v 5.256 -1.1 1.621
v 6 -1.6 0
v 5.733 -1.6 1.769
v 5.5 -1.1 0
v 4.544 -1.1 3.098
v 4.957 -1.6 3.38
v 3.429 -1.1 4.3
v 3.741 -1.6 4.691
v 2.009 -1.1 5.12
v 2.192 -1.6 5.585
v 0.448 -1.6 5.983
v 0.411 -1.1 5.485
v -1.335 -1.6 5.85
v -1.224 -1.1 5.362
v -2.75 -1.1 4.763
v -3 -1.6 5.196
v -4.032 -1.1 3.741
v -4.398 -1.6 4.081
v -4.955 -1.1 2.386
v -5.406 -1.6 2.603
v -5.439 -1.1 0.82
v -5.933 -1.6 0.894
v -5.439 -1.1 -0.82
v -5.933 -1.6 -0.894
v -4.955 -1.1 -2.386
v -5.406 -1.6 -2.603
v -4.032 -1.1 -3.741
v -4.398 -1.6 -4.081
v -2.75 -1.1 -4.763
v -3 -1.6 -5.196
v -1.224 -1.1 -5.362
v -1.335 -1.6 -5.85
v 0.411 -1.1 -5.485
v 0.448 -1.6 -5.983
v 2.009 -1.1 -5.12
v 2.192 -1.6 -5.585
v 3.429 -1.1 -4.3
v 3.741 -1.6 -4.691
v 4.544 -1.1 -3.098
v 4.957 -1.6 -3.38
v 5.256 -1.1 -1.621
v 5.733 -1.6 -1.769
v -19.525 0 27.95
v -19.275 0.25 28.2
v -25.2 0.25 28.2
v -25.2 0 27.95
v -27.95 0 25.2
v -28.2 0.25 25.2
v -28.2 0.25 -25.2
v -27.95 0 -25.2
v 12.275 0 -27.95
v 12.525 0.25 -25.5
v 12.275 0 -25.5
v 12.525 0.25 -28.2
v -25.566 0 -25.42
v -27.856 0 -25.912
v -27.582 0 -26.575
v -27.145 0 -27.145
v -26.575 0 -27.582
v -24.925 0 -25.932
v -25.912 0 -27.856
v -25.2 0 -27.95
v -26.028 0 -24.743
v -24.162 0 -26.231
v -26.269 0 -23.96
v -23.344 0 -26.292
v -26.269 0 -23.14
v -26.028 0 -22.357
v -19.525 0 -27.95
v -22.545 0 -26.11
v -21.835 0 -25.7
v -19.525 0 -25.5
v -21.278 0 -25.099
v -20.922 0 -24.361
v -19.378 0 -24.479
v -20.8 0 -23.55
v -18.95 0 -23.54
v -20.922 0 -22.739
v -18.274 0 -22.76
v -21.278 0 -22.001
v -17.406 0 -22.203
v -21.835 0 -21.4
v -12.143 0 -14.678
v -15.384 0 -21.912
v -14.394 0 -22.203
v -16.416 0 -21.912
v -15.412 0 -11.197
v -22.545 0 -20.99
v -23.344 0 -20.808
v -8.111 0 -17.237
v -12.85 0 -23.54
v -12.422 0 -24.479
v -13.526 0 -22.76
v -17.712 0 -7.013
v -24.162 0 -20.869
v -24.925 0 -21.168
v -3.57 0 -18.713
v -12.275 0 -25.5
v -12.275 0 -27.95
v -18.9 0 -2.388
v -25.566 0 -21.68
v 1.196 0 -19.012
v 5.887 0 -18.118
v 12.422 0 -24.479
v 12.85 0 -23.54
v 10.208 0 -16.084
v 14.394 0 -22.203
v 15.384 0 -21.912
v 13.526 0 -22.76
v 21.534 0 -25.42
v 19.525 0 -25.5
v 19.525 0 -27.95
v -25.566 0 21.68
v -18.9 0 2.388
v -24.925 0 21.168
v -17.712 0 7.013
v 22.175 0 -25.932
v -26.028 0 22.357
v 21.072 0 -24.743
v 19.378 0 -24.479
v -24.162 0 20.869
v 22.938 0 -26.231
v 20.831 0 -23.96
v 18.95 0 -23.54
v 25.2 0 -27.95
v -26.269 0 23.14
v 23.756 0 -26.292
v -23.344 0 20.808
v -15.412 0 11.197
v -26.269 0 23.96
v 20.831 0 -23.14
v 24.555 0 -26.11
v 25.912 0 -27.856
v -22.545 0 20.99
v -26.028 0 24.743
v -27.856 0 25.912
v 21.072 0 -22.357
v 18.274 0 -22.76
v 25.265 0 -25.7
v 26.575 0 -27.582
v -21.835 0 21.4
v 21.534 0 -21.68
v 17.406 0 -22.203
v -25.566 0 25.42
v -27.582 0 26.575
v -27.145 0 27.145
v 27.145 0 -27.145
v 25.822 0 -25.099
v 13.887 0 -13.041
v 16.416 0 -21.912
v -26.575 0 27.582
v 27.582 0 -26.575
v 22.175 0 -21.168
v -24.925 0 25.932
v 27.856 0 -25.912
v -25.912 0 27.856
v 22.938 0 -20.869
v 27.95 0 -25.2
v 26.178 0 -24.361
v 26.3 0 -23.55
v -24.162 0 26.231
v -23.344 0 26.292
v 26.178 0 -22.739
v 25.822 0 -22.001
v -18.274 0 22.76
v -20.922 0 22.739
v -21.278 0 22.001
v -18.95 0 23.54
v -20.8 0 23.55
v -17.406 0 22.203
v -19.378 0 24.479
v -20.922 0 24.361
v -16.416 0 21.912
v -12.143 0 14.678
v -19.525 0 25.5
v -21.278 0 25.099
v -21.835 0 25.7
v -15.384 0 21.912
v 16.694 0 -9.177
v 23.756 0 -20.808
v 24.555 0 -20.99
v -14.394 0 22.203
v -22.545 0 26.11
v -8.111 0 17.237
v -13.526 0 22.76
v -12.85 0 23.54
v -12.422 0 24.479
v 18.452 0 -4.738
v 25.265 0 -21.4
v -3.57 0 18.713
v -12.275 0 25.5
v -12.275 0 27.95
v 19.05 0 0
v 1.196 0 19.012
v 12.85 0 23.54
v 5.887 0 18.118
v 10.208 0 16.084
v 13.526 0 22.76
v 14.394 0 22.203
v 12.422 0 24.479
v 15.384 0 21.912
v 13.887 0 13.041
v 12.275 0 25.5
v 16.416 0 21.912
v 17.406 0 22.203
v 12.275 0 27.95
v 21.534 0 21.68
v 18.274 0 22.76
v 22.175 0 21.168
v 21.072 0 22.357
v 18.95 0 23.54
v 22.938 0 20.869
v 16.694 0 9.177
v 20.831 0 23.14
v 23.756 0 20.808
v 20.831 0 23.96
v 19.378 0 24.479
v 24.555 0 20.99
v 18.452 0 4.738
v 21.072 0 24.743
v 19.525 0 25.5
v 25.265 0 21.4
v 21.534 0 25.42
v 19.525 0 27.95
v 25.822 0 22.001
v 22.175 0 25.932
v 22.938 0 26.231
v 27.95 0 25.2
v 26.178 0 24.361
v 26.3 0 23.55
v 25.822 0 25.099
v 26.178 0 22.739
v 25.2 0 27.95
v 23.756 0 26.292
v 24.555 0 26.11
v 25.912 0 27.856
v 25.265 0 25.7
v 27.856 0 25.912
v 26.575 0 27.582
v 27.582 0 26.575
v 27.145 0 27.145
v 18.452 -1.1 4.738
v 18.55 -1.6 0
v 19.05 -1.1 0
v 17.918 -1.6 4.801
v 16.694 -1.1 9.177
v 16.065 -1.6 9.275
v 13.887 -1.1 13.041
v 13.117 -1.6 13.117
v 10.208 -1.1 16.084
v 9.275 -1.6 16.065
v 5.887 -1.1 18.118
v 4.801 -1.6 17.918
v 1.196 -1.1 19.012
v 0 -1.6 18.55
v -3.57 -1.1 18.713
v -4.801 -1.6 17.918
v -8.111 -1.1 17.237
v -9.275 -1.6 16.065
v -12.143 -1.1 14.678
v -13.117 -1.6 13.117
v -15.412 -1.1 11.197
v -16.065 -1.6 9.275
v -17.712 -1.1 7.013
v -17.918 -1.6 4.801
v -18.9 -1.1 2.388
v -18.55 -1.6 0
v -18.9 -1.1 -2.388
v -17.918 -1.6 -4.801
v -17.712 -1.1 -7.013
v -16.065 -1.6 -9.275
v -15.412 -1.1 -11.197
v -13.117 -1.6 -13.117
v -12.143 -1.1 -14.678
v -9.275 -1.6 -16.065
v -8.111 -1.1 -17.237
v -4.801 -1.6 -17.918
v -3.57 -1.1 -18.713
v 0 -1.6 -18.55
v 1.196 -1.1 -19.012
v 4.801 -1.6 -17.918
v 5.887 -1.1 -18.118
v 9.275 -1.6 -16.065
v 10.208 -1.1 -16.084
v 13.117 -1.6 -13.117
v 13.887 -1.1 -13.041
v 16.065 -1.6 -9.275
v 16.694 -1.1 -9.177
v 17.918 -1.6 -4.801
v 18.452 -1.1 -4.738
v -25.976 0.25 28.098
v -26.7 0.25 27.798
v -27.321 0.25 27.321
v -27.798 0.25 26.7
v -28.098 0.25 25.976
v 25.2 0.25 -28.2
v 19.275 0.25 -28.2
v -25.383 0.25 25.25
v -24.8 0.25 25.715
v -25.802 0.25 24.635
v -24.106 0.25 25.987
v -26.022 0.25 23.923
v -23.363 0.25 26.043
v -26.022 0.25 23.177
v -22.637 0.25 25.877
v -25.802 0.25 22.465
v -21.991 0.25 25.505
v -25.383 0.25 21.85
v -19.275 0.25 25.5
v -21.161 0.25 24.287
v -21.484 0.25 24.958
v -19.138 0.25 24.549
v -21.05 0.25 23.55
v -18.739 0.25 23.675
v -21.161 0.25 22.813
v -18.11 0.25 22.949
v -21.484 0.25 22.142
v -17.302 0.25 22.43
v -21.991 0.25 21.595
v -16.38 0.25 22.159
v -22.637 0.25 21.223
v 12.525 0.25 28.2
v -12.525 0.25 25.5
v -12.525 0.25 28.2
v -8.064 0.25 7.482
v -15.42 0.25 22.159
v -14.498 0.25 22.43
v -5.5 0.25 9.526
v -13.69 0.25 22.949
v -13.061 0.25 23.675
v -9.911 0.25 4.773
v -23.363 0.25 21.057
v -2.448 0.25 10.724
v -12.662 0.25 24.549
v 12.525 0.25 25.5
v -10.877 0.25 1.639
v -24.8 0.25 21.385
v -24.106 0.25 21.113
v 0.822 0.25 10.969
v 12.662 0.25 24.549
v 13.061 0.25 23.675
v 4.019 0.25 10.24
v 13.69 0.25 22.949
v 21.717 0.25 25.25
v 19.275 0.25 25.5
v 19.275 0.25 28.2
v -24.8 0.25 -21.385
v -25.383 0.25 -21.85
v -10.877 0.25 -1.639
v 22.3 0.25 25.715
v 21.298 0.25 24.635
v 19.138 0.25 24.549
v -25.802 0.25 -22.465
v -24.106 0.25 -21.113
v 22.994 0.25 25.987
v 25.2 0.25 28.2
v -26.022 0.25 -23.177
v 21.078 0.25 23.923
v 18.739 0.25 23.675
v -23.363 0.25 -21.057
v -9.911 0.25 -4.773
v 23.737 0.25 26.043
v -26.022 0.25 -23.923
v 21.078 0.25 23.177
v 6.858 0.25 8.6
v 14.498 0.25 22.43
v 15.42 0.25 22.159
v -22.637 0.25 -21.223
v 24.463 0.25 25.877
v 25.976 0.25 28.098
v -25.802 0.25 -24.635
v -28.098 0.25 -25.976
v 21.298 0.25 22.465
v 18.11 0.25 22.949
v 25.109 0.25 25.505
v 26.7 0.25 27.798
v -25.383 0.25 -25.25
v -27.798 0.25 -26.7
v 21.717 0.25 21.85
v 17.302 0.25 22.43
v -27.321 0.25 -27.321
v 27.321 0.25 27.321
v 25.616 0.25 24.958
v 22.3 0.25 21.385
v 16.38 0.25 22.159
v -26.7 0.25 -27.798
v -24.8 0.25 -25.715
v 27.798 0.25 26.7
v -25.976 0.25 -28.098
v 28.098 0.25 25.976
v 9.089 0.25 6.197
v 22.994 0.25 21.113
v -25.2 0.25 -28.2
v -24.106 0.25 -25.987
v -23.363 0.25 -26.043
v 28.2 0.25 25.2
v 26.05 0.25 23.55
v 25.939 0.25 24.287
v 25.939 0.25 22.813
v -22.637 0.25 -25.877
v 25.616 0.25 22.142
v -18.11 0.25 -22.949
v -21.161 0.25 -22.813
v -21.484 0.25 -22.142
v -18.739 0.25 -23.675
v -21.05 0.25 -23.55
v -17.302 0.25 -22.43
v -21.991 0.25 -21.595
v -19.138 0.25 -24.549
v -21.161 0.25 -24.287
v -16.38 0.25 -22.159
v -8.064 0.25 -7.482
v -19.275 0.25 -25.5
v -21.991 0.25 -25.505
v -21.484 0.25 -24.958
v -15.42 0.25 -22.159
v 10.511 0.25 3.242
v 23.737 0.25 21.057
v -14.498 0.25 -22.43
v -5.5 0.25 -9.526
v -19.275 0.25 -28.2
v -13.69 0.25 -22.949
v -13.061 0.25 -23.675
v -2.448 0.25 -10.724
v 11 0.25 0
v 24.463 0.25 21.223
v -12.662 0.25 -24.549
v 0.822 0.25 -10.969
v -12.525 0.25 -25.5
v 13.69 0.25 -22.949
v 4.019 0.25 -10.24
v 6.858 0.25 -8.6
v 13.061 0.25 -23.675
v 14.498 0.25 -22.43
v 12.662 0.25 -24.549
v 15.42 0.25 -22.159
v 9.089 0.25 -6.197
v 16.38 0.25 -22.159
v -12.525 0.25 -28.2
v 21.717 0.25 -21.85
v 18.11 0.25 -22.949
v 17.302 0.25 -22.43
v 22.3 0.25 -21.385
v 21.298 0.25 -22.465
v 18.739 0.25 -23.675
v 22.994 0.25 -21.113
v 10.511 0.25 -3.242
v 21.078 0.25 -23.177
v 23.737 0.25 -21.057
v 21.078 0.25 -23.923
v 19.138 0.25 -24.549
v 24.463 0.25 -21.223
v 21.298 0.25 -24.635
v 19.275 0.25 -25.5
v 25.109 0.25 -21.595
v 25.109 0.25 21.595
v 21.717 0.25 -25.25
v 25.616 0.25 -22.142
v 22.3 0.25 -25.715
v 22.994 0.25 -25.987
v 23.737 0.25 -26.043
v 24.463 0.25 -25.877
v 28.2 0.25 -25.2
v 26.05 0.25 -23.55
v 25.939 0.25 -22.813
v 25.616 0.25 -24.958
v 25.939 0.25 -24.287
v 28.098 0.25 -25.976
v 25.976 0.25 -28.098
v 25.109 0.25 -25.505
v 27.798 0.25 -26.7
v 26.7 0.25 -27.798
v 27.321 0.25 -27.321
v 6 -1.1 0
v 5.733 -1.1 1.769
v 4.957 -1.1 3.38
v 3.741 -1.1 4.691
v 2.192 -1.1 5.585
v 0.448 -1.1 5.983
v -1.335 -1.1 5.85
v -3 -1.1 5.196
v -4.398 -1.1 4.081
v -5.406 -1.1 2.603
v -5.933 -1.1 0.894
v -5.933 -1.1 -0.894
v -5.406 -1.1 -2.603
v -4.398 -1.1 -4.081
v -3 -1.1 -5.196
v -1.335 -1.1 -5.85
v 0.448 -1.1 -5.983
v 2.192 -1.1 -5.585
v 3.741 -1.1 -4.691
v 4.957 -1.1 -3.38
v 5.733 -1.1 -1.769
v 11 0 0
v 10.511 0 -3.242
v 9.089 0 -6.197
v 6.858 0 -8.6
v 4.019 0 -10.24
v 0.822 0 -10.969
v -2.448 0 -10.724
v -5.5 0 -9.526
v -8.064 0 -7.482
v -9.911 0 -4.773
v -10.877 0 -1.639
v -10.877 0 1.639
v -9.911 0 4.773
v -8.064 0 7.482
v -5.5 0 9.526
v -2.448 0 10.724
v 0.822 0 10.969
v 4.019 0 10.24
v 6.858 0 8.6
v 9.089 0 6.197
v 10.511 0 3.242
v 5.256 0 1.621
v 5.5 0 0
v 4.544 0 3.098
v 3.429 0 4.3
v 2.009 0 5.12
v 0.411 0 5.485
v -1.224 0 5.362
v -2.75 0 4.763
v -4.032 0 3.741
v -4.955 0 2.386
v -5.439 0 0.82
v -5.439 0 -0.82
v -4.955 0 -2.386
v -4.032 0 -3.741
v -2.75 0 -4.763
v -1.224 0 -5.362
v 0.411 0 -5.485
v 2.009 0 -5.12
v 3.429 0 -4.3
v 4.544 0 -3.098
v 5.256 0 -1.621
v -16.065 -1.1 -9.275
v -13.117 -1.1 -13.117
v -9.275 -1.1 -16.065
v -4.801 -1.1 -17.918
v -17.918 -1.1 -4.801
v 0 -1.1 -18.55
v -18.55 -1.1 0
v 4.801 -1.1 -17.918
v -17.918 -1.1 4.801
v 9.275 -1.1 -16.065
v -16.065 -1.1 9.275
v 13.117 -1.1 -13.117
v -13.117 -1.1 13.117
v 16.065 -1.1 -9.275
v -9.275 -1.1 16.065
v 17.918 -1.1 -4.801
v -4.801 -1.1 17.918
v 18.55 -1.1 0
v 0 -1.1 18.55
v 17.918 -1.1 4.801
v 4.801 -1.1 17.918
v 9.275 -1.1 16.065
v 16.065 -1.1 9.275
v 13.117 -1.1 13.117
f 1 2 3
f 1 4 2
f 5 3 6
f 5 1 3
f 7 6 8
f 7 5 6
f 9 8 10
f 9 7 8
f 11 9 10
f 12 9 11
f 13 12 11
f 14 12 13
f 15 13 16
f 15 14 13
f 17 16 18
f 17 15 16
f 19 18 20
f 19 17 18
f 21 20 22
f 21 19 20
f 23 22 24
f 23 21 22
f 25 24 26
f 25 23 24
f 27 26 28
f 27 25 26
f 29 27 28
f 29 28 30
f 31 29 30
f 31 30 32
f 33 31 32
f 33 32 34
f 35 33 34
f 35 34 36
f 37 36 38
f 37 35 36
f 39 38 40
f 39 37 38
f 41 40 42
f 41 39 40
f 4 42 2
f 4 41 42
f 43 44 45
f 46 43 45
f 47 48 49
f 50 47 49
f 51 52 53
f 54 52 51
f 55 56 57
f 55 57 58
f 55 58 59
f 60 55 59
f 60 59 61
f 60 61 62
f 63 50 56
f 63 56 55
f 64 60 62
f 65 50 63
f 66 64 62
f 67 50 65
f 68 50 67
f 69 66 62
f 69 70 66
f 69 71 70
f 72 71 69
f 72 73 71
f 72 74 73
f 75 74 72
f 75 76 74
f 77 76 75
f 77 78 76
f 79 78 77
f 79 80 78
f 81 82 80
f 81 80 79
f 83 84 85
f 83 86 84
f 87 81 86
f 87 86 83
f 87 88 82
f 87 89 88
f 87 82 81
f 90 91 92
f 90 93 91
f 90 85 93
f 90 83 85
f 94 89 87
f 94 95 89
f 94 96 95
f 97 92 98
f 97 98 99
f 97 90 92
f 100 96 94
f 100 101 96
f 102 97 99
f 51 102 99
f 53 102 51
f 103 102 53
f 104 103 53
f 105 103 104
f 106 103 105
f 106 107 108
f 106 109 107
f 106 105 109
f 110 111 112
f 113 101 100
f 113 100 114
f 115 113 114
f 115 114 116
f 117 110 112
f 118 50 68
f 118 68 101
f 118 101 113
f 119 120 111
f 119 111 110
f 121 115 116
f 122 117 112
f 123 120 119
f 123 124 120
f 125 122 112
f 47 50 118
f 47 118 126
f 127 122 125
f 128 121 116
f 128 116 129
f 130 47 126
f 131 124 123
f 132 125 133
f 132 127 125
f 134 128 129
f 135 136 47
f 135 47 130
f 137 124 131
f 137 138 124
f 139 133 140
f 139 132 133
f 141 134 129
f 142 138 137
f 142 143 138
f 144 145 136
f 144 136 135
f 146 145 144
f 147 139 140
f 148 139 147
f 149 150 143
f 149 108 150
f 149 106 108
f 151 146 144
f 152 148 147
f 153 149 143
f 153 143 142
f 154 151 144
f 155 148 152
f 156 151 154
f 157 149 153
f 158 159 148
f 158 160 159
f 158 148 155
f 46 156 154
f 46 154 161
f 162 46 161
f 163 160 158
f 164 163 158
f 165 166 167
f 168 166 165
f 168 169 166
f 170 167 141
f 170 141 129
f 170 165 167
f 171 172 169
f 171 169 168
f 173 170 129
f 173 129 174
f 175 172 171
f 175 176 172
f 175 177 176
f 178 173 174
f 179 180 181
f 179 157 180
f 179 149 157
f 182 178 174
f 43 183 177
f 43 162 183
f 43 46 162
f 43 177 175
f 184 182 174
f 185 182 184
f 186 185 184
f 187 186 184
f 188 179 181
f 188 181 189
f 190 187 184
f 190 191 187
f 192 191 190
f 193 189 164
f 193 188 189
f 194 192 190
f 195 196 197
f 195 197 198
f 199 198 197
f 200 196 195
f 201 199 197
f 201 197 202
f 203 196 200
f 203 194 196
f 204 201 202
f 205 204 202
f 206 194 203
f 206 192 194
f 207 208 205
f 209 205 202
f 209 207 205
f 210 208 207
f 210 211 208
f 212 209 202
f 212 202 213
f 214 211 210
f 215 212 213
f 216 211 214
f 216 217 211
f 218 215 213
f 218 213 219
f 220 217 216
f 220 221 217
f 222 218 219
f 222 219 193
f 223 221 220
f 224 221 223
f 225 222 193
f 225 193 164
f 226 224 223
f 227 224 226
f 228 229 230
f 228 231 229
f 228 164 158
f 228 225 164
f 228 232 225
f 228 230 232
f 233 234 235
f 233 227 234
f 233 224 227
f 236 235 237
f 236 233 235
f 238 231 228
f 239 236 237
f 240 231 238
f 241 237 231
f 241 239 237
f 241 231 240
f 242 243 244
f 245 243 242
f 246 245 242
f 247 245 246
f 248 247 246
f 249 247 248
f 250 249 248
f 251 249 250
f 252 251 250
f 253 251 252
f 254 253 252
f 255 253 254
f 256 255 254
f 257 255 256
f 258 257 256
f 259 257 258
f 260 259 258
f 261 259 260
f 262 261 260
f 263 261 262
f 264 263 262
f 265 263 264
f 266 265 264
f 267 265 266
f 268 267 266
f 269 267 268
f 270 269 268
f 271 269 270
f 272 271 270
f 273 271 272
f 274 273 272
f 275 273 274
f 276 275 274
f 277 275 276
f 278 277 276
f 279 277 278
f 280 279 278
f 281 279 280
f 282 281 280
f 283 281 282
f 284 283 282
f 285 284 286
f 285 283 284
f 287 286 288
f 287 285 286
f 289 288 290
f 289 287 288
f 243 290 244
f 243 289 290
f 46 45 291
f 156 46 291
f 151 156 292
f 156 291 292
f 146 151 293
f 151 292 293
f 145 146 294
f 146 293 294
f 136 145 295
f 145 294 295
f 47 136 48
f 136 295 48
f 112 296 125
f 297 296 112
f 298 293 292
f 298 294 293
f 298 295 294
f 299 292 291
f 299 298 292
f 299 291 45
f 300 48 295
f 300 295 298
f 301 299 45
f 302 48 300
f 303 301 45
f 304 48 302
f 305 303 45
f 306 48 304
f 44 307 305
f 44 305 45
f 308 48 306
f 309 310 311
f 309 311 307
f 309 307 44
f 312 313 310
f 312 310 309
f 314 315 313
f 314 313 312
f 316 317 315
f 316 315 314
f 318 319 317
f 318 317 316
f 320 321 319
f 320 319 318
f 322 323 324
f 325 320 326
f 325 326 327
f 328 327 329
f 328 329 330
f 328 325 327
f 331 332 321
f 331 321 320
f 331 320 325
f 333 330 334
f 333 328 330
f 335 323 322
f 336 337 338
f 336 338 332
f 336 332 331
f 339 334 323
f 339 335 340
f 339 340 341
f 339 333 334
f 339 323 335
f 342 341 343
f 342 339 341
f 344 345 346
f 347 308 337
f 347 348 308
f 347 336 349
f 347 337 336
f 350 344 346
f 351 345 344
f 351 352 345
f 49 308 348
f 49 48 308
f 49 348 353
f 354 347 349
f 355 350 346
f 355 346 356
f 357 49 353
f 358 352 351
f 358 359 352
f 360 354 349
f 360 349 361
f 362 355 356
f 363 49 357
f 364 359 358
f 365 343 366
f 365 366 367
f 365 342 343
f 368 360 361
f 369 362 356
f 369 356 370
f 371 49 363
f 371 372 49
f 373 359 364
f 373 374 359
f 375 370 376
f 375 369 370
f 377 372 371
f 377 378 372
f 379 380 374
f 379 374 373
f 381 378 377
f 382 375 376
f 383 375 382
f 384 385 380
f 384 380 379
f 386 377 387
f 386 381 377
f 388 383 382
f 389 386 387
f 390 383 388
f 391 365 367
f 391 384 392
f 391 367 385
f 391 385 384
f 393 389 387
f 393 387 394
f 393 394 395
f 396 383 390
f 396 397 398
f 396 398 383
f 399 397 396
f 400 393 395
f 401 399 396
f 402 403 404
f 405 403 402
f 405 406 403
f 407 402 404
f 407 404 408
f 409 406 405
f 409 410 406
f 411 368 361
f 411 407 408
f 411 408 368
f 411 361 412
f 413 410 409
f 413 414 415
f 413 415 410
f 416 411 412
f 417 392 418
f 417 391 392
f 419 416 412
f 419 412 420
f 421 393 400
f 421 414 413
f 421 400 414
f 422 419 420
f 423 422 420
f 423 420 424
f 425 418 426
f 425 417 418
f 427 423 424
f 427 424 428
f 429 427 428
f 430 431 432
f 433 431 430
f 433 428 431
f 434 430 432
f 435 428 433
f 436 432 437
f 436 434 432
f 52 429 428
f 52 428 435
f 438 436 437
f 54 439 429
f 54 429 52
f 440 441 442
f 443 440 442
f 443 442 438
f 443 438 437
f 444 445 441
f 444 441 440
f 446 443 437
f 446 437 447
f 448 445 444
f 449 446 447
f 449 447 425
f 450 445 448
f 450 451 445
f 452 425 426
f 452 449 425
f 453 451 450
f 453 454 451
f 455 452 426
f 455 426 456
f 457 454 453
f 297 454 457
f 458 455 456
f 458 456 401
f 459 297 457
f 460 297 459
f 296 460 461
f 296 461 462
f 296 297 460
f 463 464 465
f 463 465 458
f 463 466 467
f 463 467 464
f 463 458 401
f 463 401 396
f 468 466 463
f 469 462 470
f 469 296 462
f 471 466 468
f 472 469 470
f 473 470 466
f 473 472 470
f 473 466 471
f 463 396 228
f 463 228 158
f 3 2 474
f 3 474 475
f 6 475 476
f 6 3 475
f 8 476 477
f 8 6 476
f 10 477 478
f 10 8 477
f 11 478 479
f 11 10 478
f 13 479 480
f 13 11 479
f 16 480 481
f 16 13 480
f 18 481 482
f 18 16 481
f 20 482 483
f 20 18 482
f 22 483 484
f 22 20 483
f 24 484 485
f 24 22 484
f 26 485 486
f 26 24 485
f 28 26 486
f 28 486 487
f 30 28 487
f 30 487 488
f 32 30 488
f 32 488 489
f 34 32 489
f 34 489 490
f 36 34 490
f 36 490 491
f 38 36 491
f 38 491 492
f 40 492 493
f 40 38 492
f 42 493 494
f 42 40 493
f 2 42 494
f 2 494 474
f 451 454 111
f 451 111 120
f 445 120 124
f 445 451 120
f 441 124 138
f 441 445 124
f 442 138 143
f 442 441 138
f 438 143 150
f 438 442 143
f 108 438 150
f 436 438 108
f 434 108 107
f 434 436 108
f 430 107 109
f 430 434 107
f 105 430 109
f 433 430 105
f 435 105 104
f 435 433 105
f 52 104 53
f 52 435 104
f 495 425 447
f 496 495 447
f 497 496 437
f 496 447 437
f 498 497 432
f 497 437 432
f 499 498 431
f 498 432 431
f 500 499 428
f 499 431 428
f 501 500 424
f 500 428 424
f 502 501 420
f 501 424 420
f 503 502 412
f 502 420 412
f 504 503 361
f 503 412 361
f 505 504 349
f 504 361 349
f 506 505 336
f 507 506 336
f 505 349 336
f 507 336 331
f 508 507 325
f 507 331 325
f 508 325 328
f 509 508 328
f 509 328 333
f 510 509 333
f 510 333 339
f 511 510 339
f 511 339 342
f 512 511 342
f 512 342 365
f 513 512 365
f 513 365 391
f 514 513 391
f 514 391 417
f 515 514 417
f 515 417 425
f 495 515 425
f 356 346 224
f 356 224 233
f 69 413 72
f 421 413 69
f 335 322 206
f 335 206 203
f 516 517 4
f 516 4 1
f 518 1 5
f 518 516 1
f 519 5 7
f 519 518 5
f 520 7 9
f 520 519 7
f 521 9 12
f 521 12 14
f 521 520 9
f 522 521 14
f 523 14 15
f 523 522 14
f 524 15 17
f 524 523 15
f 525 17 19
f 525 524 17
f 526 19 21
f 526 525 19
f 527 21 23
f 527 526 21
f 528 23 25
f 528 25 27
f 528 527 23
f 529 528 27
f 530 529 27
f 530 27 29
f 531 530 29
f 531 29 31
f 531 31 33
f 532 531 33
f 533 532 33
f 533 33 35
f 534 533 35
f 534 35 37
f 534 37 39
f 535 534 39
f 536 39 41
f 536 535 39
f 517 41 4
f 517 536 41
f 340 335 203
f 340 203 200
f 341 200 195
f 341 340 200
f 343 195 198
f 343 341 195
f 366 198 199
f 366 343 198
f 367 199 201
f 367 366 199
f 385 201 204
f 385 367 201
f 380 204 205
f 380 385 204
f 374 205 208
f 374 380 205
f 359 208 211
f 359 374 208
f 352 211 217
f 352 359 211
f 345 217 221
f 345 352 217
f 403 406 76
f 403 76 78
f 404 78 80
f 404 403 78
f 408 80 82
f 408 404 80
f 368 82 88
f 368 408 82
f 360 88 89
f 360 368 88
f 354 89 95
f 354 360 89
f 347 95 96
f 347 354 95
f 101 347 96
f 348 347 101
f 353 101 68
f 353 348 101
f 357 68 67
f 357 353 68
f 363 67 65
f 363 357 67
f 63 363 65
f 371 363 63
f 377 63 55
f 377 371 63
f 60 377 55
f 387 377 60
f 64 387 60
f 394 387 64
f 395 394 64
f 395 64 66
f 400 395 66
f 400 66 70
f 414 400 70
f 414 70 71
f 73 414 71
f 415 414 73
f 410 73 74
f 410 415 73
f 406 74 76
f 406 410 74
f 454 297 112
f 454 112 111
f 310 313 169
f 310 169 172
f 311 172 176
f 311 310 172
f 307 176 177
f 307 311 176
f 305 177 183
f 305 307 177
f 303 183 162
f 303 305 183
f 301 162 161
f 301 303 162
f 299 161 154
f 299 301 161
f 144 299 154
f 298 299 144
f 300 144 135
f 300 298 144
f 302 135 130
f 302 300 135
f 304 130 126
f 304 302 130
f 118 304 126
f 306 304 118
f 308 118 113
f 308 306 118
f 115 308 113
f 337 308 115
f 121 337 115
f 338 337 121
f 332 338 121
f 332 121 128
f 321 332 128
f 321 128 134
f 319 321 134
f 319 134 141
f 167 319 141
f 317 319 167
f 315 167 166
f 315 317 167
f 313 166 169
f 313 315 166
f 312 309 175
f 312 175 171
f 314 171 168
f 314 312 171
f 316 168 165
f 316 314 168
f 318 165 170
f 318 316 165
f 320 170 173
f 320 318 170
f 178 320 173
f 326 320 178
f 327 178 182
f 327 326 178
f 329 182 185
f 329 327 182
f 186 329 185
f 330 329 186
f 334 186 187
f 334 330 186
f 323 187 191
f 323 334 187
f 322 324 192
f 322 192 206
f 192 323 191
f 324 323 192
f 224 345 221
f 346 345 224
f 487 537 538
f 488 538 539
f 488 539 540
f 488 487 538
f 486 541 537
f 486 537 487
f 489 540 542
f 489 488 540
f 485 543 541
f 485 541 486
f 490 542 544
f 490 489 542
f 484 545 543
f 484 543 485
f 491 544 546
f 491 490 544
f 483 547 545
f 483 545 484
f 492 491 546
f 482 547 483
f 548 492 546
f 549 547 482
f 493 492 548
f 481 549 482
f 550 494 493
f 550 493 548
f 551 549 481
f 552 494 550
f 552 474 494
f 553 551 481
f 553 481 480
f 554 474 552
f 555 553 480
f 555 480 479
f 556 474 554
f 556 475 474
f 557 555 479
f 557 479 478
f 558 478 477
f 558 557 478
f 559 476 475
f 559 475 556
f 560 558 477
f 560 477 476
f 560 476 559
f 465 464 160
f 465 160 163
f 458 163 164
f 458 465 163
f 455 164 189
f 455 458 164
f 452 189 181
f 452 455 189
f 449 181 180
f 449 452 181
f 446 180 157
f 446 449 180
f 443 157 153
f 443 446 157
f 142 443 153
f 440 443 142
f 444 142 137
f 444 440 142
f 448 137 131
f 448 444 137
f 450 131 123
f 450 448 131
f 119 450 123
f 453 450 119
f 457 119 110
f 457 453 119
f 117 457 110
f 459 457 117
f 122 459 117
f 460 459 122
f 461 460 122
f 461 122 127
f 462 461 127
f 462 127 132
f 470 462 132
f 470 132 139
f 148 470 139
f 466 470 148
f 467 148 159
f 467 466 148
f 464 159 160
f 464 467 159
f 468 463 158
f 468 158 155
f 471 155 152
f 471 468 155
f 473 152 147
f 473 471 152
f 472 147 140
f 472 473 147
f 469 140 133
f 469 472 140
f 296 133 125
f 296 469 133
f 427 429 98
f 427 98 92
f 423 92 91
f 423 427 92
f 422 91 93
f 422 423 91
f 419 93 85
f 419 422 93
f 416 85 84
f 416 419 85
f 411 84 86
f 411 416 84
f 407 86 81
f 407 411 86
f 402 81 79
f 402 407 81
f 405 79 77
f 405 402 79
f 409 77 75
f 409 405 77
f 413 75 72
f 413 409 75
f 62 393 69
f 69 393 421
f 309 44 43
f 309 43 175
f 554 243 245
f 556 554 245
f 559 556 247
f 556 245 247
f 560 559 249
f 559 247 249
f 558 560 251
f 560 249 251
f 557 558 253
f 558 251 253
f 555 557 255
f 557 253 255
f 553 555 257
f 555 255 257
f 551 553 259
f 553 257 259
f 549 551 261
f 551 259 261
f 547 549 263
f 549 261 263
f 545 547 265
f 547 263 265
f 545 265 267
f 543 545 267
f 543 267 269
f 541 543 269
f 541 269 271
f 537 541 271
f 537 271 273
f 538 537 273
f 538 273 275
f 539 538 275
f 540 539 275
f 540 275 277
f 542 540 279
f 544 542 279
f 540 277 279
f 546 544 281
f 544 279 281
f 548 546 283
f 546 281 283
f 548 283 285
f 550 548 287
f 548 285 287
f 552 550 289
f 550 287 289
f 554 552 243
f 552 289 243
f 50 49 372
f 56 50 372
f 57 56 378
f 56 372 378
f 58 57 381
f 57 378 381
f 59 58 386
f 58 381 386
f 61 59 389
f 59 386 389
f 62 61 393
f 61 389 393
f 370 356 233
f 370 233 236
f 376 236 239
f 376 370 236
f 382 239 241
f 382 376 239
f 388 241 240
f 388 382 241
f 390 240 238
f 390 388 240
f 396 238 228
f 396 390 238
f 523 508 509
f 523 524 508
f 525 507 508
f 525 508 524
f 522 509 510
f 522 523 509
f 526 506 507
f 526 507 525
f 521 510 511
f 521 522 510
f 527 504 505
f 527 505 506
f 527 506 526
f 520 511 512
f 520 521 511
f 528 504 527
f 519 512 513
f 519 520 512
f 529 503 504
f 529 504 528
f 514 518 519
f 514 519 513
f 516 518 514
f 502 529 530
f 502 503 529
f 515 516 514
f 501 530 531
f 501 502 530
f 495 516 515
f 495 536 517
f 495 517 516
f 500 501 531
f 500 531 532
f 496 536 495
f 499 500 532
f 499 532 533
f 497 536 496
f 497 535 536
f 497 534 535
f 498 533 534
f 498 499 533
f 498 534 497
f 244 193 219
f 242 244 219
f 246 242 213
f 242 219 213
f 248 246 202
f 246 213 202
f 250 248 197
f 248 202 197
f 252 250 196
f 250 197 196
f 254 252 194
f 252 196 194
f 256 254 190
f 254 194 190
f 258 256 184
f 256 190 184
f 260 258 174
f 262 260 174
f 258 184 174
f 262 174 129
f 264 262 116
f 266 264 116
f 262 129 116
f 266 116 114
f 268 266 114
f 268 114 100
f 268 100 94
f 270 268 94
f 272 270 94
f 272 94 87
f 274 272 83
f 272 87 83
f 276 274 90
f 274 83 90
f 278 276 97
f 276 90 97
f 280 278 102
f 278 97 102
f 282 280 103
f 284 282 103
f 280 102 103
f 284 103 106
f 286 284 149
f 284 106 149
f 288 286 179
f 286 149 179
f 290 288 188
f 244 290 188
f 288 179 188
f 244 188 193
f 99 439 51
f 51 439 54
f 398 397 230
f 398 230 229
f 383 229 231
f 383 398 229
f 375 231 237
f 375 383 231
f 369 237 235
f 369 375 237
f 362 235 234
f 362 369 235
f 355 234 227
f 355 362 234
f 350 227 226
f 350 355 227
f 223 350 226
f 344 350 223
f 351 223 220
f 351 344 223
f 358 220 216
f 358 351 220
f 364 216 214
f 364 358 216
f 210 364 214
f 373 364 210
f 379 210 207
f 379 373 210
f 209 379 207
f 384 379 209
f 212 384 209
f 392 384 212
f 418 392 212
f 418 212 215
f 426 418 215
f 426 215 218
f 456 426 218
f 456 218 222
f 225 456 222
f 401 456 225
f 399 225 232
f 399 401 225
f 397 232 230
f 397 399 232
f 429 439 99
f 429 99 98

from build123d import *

# Parameters (mm, degrees)
SKETCH036_R     = 5.5
PAD020_DEPTH    = 6
SKETCH035_R     = 5.5
PAD019_DEPTH    = 5
SKETCH037_R     = 19.05
SKETCH037_R_2   = 5.5
PAD021_DEPTH    = 1.6
SKETCH038_R     = 2.5
POCKET015_DEPTH = 11.001
SKETCH039_R     = 1.5
POCKET016_DEPTH = 12.601
POCKET017_DEPTH = 3
SKETCH041_R     = 11
POCKET018_DEPTH = 11
CHAMFER004_SIZE = 0.25
CHAMFER005_SIZE = 0.5
SKETCH042_R     = 40.822693
POCKET022_DEPTH = 10.75
SKETCH043_R     = 18.55
SKETCH043_R_2   = 6
POCKET023_DEPTH = 0.5


with BuildPart() as part:
    # Sketch036 → Pad020 (new body)
    with BuildSketch(Plane(origin=(0, 5, 0), x_dir=(1, 0, 0), z_dir=(0, 1, 0))):
        with BuildLine():
            Line((-26.2, 19.45), (-23.7, 19.45))
            ThreePointArc((-23.7, 19.45), (-20.694796, 20.694796), (-19.45, 23.7))
            Line((-19.45, 23.7), (-19.45, 26.2))
            ThreePointArc((-17.45, 28.2), (-18.864214, 27.614214), (-19.45, 26.2))
            Line((-17.45, 28.2), (17.45, 28.2))
            ThreePointArc((19.45, 26.2), (18.864214, 27.614214), (17.45, 28.2))
            Line((19.45, 26.2), (19.45, 23.7))
            ThreePointArc((19.45, 23.7), (20.694796, 20.694796), (23.7, 19.45))
            Line((23.7, 19.45), (26.2, 19.45))
            ThreePointArc((28.2, 17.45), (27.614214, 18.864214), (26.2, 19.45))
            Line((28.2, 17.45), (28.2, -17.45))
            ThreePointArc((26.2, -19.45), (27.614214, -18.864214), (28.2, -17.45))
            Line((23.7, -19.45), (26.2, -19.45))
            ThreePointArc((23.7, -19.45), (20.694796, -20.694796), (19.45, -23.7))
            Line((19.45, -26.2), (19.45, -23.7))
            ThreePointArc((17.45, -28.2), (18.864214, -27.614214), (19.45, -26.2))
            Line((-17.45, -28.2), (17.45, -28.2))
            ThreePointArc((-19.45, -26.2), (-18.864214, -27.614214), (-17.45, -28.2))
            Line((-19.45, -26.2), (-19.45, -23.7))
            ThreePointArc((-19.45, -23.7), (-20.694796, -20.694796), (-23.7, -19.45))
            Line((-26.2, -19.45), (-23.7, -19.45))
            ThreePointArc((-28.2, -17.45), (-27.614214, -18.864214), (-26.2, -19.45))
            Line((-28.2, 17.45), (-28.2, -17.45))
            ThreePointArc((-26.2, 19.45), (-27.614214, 18.864214), (-28.2, 17.45))
        make_face()
        Circle(SKETCH036_R, mode=Mode.SUBTRACT)
    extrude(amount=PAD020_DEPTH)

    # Sketch035 (on Face26 of Pad020) → Pad019 (join)
    with BuildSketch(Plane.XZ.offset(-5)):
        with BuildLine():
            Line((-28.2, 25.2), (-28.2, -25.2))
            ThreePointArc((-28.2, -25.2), (-27.32132, -27.32132), (-25.2, -28.2))
            Line((-25.2, -28.2), (25.2, -28.2))
            ThreePointArc((25.2, -28.2), (27.32132, -27.32132), (28.2, -25.2))
            Line((28.2, 25.2), (28.2, -25.2))
            ThreePointArc((28.2, 25.2), (27.32132, 27.32132), (25.2, 28.2))
            Line((-25.2, 28.2), (25.2, 28.2))
            ThreePointArc((-25.2, 28.2), (-27.32132, 27.32132), (-28.2, 25.2))
        make_face()
        Circle(SKETCH035_R, mode=Mode.SUBTRACT)
    extrude(amount=PAD019_DEPTH)

    # Sketch037 (on Face33 of Pad019) → Pad021 (join)
    with BuildSketch(Plane.XZ):
        Circle(SKETCH037_R)
        Circle(SKETCH037_R_2, mode=Mode.SUBTRACT)
    extrude(amount=PAD021_DEPTH)

    # Sketch038 (on Face33 of Pad021) → Pocket015 (cut, through all)
    with BuildSketch(Plane.XZ):
        with Locations((-23.55, 23.55)):
            Circle(SKETCH038_R)
        with Locations((23.55, 23.55)):
            Circle(SKETCH038_R)
        with Locations((23.55, -23.55)):
            Circle(SKETCH038_R)
        with Locations((-23.55, -23.55)):
            Circle(SKETCH038_R)
    extrude(amount=-POCKET015_DEPTH, mode=Mode.SUBTRACT)

    # Sketch039 (on Face5 of Pocket015) → Pocket016 (cut, through all)
    with BuildSketch(Plane(origin=(0, 11, 0), x_dir=(1, 0, 0), z_dir=(0, 1, 0))):
        with Locations((-15.9, 25.5)):
            Circle(SKETCH039_R)
        with Locations((15.9, 25.5)):
            Circle(SKETCH039_R)
        with Locations((-15.9, -25.5)):
            Circle(SKETCH039_R)
        with Locations((15.9, -25.5)):
            Circle(SKETCH039_R)
    extrude(amount=-POCKET016_DEPTH, mode=Mode.SUBTRACT)

    # Sketch040 (on Face38 of Pocket016) → Pocket017 (cut)
    with BuildSketch(Plane.XZ):
        with BuildLine():
            Line((-19.275, -25.5), (-19.275, -30.5))
            Line((-19.275, -30.5), (-12.525, -30.5))
            Line((-12.525, -30.5), (-12.525, -25.5))
            ThreePointArc((-12.525, -25.5), (-15.9, -22.125), (-19.275, -25.5))
        make_face()
        with BuildLine():
            Line((12.525, -25.5), (12.525, -30.5))
            Line((12.525, -30.5), (19.275, -30.5))
            Line((19.275, -30.5), (19.275, -25.5))
            ThreePointArc((19.275, -25.5), (15.9, -22.125), (12.525, -25.5))
        make_face()
        with BuildLine():
            Line((-19.275, 25.5), (-19.275, 30.5))
            Line((-19.275, 30.5), (-12.525, 30.5))
            Line((-12.525, 30.5), (-12.525, 25.5))
            ThreePointArc((-19.275, 25.5), (-15.9, 22.125), (-12.525, 25.5))
        make_face()
        with BuildLine():
            Line((12.525, 25.5), (12.525, 30.5))
            Line((12.525, 30.5), (19.275, 30.5))
            Line((19.275, 30.5), (19.275, 25.5))
            ThreePointArc((12.525, 25.5), (15.9, 22.125), (19.275, 25.5))
        make_face()
    extrude(amount=-POCKET017_DEPTH, mode=Mode.SUBTRACT)

    # Sketch041 (on Face5 of Pocket017) → Pocket018 (cut)
    with BuildSketch(Plane(origin=(0, 11, 0), x_dir=(1, 0, 0), z_dir=(0, 1, 0))):
        Circle(SKETCH041_R)
    extrude(amount=-POCKET018_DEPTH, mode=Mode.SUBTRACT)

    # Chamfer004
    chamfer004_edges = [part.edges().sort_by_distance(p)[0] for p in [
        (-28.2, 0, 0),
        (-27.32132, 0, 27.32132),
        (-26.05, 0, 23.55),
        (-22.2375, 0, 28.2),
        (-15.9, 0, 22.125),
        (0, 0, 28.2),
        (15.9, 0, 22.125),
        (21.05, 0, 23.55),
        (28.2, 0, 0),
        (-27.32132, 0, -27.32132),
        (-22.2375, 0, -28.2),
        (-26.05, 0, -23.55),
        (-15.9, 0, -22.125),
        (0, 0, -28.2),
        (27.32132, 0, -27.32132),
        (22.2375, 0, -28.2),
        (21.05, 0, -23.55),
        (15.9, 0, -22.125),
    ]]
    chamfer(chamfer004_edges, length=CHAMFER004_SIZE)

    # Chamfer005
    chamfer005_edges = [part.edges().sort_by_distance(p)[0] for p in [
        (-19.05, -1.6, 0),
        (-5.5, -1.6, 0),
    ]]
    chamfer(chamfer005_edges, length=CHAMFER005_SIZE)

    # Sketch042 (on Face7 of Pocket018) → Pocket022 (cut)
    with BuildSketch(Plane(origin=(0, 11, 0), x_dir=(1, 0, 0), z_dir=(0, 1, 0))):
        Circle(SKETCH042_R)
    extrude(amount=-POCKET022_DEPTH, mode=Mode.SUBTRACT)

    # Sketch043 (on Face4 of Pocket022) → Pocket023 (cut)
    with BuildSketch(Plane.XZ.offset(1.6)):
        Circle(SKETCH043_R)
        Circle(SKETCH043_R_2, mode=Mode.SUBTRACT)
    extrude(amount=-POCKET023_DEPTH, mode=Mode.SUBTRACT)


solid = part.part
